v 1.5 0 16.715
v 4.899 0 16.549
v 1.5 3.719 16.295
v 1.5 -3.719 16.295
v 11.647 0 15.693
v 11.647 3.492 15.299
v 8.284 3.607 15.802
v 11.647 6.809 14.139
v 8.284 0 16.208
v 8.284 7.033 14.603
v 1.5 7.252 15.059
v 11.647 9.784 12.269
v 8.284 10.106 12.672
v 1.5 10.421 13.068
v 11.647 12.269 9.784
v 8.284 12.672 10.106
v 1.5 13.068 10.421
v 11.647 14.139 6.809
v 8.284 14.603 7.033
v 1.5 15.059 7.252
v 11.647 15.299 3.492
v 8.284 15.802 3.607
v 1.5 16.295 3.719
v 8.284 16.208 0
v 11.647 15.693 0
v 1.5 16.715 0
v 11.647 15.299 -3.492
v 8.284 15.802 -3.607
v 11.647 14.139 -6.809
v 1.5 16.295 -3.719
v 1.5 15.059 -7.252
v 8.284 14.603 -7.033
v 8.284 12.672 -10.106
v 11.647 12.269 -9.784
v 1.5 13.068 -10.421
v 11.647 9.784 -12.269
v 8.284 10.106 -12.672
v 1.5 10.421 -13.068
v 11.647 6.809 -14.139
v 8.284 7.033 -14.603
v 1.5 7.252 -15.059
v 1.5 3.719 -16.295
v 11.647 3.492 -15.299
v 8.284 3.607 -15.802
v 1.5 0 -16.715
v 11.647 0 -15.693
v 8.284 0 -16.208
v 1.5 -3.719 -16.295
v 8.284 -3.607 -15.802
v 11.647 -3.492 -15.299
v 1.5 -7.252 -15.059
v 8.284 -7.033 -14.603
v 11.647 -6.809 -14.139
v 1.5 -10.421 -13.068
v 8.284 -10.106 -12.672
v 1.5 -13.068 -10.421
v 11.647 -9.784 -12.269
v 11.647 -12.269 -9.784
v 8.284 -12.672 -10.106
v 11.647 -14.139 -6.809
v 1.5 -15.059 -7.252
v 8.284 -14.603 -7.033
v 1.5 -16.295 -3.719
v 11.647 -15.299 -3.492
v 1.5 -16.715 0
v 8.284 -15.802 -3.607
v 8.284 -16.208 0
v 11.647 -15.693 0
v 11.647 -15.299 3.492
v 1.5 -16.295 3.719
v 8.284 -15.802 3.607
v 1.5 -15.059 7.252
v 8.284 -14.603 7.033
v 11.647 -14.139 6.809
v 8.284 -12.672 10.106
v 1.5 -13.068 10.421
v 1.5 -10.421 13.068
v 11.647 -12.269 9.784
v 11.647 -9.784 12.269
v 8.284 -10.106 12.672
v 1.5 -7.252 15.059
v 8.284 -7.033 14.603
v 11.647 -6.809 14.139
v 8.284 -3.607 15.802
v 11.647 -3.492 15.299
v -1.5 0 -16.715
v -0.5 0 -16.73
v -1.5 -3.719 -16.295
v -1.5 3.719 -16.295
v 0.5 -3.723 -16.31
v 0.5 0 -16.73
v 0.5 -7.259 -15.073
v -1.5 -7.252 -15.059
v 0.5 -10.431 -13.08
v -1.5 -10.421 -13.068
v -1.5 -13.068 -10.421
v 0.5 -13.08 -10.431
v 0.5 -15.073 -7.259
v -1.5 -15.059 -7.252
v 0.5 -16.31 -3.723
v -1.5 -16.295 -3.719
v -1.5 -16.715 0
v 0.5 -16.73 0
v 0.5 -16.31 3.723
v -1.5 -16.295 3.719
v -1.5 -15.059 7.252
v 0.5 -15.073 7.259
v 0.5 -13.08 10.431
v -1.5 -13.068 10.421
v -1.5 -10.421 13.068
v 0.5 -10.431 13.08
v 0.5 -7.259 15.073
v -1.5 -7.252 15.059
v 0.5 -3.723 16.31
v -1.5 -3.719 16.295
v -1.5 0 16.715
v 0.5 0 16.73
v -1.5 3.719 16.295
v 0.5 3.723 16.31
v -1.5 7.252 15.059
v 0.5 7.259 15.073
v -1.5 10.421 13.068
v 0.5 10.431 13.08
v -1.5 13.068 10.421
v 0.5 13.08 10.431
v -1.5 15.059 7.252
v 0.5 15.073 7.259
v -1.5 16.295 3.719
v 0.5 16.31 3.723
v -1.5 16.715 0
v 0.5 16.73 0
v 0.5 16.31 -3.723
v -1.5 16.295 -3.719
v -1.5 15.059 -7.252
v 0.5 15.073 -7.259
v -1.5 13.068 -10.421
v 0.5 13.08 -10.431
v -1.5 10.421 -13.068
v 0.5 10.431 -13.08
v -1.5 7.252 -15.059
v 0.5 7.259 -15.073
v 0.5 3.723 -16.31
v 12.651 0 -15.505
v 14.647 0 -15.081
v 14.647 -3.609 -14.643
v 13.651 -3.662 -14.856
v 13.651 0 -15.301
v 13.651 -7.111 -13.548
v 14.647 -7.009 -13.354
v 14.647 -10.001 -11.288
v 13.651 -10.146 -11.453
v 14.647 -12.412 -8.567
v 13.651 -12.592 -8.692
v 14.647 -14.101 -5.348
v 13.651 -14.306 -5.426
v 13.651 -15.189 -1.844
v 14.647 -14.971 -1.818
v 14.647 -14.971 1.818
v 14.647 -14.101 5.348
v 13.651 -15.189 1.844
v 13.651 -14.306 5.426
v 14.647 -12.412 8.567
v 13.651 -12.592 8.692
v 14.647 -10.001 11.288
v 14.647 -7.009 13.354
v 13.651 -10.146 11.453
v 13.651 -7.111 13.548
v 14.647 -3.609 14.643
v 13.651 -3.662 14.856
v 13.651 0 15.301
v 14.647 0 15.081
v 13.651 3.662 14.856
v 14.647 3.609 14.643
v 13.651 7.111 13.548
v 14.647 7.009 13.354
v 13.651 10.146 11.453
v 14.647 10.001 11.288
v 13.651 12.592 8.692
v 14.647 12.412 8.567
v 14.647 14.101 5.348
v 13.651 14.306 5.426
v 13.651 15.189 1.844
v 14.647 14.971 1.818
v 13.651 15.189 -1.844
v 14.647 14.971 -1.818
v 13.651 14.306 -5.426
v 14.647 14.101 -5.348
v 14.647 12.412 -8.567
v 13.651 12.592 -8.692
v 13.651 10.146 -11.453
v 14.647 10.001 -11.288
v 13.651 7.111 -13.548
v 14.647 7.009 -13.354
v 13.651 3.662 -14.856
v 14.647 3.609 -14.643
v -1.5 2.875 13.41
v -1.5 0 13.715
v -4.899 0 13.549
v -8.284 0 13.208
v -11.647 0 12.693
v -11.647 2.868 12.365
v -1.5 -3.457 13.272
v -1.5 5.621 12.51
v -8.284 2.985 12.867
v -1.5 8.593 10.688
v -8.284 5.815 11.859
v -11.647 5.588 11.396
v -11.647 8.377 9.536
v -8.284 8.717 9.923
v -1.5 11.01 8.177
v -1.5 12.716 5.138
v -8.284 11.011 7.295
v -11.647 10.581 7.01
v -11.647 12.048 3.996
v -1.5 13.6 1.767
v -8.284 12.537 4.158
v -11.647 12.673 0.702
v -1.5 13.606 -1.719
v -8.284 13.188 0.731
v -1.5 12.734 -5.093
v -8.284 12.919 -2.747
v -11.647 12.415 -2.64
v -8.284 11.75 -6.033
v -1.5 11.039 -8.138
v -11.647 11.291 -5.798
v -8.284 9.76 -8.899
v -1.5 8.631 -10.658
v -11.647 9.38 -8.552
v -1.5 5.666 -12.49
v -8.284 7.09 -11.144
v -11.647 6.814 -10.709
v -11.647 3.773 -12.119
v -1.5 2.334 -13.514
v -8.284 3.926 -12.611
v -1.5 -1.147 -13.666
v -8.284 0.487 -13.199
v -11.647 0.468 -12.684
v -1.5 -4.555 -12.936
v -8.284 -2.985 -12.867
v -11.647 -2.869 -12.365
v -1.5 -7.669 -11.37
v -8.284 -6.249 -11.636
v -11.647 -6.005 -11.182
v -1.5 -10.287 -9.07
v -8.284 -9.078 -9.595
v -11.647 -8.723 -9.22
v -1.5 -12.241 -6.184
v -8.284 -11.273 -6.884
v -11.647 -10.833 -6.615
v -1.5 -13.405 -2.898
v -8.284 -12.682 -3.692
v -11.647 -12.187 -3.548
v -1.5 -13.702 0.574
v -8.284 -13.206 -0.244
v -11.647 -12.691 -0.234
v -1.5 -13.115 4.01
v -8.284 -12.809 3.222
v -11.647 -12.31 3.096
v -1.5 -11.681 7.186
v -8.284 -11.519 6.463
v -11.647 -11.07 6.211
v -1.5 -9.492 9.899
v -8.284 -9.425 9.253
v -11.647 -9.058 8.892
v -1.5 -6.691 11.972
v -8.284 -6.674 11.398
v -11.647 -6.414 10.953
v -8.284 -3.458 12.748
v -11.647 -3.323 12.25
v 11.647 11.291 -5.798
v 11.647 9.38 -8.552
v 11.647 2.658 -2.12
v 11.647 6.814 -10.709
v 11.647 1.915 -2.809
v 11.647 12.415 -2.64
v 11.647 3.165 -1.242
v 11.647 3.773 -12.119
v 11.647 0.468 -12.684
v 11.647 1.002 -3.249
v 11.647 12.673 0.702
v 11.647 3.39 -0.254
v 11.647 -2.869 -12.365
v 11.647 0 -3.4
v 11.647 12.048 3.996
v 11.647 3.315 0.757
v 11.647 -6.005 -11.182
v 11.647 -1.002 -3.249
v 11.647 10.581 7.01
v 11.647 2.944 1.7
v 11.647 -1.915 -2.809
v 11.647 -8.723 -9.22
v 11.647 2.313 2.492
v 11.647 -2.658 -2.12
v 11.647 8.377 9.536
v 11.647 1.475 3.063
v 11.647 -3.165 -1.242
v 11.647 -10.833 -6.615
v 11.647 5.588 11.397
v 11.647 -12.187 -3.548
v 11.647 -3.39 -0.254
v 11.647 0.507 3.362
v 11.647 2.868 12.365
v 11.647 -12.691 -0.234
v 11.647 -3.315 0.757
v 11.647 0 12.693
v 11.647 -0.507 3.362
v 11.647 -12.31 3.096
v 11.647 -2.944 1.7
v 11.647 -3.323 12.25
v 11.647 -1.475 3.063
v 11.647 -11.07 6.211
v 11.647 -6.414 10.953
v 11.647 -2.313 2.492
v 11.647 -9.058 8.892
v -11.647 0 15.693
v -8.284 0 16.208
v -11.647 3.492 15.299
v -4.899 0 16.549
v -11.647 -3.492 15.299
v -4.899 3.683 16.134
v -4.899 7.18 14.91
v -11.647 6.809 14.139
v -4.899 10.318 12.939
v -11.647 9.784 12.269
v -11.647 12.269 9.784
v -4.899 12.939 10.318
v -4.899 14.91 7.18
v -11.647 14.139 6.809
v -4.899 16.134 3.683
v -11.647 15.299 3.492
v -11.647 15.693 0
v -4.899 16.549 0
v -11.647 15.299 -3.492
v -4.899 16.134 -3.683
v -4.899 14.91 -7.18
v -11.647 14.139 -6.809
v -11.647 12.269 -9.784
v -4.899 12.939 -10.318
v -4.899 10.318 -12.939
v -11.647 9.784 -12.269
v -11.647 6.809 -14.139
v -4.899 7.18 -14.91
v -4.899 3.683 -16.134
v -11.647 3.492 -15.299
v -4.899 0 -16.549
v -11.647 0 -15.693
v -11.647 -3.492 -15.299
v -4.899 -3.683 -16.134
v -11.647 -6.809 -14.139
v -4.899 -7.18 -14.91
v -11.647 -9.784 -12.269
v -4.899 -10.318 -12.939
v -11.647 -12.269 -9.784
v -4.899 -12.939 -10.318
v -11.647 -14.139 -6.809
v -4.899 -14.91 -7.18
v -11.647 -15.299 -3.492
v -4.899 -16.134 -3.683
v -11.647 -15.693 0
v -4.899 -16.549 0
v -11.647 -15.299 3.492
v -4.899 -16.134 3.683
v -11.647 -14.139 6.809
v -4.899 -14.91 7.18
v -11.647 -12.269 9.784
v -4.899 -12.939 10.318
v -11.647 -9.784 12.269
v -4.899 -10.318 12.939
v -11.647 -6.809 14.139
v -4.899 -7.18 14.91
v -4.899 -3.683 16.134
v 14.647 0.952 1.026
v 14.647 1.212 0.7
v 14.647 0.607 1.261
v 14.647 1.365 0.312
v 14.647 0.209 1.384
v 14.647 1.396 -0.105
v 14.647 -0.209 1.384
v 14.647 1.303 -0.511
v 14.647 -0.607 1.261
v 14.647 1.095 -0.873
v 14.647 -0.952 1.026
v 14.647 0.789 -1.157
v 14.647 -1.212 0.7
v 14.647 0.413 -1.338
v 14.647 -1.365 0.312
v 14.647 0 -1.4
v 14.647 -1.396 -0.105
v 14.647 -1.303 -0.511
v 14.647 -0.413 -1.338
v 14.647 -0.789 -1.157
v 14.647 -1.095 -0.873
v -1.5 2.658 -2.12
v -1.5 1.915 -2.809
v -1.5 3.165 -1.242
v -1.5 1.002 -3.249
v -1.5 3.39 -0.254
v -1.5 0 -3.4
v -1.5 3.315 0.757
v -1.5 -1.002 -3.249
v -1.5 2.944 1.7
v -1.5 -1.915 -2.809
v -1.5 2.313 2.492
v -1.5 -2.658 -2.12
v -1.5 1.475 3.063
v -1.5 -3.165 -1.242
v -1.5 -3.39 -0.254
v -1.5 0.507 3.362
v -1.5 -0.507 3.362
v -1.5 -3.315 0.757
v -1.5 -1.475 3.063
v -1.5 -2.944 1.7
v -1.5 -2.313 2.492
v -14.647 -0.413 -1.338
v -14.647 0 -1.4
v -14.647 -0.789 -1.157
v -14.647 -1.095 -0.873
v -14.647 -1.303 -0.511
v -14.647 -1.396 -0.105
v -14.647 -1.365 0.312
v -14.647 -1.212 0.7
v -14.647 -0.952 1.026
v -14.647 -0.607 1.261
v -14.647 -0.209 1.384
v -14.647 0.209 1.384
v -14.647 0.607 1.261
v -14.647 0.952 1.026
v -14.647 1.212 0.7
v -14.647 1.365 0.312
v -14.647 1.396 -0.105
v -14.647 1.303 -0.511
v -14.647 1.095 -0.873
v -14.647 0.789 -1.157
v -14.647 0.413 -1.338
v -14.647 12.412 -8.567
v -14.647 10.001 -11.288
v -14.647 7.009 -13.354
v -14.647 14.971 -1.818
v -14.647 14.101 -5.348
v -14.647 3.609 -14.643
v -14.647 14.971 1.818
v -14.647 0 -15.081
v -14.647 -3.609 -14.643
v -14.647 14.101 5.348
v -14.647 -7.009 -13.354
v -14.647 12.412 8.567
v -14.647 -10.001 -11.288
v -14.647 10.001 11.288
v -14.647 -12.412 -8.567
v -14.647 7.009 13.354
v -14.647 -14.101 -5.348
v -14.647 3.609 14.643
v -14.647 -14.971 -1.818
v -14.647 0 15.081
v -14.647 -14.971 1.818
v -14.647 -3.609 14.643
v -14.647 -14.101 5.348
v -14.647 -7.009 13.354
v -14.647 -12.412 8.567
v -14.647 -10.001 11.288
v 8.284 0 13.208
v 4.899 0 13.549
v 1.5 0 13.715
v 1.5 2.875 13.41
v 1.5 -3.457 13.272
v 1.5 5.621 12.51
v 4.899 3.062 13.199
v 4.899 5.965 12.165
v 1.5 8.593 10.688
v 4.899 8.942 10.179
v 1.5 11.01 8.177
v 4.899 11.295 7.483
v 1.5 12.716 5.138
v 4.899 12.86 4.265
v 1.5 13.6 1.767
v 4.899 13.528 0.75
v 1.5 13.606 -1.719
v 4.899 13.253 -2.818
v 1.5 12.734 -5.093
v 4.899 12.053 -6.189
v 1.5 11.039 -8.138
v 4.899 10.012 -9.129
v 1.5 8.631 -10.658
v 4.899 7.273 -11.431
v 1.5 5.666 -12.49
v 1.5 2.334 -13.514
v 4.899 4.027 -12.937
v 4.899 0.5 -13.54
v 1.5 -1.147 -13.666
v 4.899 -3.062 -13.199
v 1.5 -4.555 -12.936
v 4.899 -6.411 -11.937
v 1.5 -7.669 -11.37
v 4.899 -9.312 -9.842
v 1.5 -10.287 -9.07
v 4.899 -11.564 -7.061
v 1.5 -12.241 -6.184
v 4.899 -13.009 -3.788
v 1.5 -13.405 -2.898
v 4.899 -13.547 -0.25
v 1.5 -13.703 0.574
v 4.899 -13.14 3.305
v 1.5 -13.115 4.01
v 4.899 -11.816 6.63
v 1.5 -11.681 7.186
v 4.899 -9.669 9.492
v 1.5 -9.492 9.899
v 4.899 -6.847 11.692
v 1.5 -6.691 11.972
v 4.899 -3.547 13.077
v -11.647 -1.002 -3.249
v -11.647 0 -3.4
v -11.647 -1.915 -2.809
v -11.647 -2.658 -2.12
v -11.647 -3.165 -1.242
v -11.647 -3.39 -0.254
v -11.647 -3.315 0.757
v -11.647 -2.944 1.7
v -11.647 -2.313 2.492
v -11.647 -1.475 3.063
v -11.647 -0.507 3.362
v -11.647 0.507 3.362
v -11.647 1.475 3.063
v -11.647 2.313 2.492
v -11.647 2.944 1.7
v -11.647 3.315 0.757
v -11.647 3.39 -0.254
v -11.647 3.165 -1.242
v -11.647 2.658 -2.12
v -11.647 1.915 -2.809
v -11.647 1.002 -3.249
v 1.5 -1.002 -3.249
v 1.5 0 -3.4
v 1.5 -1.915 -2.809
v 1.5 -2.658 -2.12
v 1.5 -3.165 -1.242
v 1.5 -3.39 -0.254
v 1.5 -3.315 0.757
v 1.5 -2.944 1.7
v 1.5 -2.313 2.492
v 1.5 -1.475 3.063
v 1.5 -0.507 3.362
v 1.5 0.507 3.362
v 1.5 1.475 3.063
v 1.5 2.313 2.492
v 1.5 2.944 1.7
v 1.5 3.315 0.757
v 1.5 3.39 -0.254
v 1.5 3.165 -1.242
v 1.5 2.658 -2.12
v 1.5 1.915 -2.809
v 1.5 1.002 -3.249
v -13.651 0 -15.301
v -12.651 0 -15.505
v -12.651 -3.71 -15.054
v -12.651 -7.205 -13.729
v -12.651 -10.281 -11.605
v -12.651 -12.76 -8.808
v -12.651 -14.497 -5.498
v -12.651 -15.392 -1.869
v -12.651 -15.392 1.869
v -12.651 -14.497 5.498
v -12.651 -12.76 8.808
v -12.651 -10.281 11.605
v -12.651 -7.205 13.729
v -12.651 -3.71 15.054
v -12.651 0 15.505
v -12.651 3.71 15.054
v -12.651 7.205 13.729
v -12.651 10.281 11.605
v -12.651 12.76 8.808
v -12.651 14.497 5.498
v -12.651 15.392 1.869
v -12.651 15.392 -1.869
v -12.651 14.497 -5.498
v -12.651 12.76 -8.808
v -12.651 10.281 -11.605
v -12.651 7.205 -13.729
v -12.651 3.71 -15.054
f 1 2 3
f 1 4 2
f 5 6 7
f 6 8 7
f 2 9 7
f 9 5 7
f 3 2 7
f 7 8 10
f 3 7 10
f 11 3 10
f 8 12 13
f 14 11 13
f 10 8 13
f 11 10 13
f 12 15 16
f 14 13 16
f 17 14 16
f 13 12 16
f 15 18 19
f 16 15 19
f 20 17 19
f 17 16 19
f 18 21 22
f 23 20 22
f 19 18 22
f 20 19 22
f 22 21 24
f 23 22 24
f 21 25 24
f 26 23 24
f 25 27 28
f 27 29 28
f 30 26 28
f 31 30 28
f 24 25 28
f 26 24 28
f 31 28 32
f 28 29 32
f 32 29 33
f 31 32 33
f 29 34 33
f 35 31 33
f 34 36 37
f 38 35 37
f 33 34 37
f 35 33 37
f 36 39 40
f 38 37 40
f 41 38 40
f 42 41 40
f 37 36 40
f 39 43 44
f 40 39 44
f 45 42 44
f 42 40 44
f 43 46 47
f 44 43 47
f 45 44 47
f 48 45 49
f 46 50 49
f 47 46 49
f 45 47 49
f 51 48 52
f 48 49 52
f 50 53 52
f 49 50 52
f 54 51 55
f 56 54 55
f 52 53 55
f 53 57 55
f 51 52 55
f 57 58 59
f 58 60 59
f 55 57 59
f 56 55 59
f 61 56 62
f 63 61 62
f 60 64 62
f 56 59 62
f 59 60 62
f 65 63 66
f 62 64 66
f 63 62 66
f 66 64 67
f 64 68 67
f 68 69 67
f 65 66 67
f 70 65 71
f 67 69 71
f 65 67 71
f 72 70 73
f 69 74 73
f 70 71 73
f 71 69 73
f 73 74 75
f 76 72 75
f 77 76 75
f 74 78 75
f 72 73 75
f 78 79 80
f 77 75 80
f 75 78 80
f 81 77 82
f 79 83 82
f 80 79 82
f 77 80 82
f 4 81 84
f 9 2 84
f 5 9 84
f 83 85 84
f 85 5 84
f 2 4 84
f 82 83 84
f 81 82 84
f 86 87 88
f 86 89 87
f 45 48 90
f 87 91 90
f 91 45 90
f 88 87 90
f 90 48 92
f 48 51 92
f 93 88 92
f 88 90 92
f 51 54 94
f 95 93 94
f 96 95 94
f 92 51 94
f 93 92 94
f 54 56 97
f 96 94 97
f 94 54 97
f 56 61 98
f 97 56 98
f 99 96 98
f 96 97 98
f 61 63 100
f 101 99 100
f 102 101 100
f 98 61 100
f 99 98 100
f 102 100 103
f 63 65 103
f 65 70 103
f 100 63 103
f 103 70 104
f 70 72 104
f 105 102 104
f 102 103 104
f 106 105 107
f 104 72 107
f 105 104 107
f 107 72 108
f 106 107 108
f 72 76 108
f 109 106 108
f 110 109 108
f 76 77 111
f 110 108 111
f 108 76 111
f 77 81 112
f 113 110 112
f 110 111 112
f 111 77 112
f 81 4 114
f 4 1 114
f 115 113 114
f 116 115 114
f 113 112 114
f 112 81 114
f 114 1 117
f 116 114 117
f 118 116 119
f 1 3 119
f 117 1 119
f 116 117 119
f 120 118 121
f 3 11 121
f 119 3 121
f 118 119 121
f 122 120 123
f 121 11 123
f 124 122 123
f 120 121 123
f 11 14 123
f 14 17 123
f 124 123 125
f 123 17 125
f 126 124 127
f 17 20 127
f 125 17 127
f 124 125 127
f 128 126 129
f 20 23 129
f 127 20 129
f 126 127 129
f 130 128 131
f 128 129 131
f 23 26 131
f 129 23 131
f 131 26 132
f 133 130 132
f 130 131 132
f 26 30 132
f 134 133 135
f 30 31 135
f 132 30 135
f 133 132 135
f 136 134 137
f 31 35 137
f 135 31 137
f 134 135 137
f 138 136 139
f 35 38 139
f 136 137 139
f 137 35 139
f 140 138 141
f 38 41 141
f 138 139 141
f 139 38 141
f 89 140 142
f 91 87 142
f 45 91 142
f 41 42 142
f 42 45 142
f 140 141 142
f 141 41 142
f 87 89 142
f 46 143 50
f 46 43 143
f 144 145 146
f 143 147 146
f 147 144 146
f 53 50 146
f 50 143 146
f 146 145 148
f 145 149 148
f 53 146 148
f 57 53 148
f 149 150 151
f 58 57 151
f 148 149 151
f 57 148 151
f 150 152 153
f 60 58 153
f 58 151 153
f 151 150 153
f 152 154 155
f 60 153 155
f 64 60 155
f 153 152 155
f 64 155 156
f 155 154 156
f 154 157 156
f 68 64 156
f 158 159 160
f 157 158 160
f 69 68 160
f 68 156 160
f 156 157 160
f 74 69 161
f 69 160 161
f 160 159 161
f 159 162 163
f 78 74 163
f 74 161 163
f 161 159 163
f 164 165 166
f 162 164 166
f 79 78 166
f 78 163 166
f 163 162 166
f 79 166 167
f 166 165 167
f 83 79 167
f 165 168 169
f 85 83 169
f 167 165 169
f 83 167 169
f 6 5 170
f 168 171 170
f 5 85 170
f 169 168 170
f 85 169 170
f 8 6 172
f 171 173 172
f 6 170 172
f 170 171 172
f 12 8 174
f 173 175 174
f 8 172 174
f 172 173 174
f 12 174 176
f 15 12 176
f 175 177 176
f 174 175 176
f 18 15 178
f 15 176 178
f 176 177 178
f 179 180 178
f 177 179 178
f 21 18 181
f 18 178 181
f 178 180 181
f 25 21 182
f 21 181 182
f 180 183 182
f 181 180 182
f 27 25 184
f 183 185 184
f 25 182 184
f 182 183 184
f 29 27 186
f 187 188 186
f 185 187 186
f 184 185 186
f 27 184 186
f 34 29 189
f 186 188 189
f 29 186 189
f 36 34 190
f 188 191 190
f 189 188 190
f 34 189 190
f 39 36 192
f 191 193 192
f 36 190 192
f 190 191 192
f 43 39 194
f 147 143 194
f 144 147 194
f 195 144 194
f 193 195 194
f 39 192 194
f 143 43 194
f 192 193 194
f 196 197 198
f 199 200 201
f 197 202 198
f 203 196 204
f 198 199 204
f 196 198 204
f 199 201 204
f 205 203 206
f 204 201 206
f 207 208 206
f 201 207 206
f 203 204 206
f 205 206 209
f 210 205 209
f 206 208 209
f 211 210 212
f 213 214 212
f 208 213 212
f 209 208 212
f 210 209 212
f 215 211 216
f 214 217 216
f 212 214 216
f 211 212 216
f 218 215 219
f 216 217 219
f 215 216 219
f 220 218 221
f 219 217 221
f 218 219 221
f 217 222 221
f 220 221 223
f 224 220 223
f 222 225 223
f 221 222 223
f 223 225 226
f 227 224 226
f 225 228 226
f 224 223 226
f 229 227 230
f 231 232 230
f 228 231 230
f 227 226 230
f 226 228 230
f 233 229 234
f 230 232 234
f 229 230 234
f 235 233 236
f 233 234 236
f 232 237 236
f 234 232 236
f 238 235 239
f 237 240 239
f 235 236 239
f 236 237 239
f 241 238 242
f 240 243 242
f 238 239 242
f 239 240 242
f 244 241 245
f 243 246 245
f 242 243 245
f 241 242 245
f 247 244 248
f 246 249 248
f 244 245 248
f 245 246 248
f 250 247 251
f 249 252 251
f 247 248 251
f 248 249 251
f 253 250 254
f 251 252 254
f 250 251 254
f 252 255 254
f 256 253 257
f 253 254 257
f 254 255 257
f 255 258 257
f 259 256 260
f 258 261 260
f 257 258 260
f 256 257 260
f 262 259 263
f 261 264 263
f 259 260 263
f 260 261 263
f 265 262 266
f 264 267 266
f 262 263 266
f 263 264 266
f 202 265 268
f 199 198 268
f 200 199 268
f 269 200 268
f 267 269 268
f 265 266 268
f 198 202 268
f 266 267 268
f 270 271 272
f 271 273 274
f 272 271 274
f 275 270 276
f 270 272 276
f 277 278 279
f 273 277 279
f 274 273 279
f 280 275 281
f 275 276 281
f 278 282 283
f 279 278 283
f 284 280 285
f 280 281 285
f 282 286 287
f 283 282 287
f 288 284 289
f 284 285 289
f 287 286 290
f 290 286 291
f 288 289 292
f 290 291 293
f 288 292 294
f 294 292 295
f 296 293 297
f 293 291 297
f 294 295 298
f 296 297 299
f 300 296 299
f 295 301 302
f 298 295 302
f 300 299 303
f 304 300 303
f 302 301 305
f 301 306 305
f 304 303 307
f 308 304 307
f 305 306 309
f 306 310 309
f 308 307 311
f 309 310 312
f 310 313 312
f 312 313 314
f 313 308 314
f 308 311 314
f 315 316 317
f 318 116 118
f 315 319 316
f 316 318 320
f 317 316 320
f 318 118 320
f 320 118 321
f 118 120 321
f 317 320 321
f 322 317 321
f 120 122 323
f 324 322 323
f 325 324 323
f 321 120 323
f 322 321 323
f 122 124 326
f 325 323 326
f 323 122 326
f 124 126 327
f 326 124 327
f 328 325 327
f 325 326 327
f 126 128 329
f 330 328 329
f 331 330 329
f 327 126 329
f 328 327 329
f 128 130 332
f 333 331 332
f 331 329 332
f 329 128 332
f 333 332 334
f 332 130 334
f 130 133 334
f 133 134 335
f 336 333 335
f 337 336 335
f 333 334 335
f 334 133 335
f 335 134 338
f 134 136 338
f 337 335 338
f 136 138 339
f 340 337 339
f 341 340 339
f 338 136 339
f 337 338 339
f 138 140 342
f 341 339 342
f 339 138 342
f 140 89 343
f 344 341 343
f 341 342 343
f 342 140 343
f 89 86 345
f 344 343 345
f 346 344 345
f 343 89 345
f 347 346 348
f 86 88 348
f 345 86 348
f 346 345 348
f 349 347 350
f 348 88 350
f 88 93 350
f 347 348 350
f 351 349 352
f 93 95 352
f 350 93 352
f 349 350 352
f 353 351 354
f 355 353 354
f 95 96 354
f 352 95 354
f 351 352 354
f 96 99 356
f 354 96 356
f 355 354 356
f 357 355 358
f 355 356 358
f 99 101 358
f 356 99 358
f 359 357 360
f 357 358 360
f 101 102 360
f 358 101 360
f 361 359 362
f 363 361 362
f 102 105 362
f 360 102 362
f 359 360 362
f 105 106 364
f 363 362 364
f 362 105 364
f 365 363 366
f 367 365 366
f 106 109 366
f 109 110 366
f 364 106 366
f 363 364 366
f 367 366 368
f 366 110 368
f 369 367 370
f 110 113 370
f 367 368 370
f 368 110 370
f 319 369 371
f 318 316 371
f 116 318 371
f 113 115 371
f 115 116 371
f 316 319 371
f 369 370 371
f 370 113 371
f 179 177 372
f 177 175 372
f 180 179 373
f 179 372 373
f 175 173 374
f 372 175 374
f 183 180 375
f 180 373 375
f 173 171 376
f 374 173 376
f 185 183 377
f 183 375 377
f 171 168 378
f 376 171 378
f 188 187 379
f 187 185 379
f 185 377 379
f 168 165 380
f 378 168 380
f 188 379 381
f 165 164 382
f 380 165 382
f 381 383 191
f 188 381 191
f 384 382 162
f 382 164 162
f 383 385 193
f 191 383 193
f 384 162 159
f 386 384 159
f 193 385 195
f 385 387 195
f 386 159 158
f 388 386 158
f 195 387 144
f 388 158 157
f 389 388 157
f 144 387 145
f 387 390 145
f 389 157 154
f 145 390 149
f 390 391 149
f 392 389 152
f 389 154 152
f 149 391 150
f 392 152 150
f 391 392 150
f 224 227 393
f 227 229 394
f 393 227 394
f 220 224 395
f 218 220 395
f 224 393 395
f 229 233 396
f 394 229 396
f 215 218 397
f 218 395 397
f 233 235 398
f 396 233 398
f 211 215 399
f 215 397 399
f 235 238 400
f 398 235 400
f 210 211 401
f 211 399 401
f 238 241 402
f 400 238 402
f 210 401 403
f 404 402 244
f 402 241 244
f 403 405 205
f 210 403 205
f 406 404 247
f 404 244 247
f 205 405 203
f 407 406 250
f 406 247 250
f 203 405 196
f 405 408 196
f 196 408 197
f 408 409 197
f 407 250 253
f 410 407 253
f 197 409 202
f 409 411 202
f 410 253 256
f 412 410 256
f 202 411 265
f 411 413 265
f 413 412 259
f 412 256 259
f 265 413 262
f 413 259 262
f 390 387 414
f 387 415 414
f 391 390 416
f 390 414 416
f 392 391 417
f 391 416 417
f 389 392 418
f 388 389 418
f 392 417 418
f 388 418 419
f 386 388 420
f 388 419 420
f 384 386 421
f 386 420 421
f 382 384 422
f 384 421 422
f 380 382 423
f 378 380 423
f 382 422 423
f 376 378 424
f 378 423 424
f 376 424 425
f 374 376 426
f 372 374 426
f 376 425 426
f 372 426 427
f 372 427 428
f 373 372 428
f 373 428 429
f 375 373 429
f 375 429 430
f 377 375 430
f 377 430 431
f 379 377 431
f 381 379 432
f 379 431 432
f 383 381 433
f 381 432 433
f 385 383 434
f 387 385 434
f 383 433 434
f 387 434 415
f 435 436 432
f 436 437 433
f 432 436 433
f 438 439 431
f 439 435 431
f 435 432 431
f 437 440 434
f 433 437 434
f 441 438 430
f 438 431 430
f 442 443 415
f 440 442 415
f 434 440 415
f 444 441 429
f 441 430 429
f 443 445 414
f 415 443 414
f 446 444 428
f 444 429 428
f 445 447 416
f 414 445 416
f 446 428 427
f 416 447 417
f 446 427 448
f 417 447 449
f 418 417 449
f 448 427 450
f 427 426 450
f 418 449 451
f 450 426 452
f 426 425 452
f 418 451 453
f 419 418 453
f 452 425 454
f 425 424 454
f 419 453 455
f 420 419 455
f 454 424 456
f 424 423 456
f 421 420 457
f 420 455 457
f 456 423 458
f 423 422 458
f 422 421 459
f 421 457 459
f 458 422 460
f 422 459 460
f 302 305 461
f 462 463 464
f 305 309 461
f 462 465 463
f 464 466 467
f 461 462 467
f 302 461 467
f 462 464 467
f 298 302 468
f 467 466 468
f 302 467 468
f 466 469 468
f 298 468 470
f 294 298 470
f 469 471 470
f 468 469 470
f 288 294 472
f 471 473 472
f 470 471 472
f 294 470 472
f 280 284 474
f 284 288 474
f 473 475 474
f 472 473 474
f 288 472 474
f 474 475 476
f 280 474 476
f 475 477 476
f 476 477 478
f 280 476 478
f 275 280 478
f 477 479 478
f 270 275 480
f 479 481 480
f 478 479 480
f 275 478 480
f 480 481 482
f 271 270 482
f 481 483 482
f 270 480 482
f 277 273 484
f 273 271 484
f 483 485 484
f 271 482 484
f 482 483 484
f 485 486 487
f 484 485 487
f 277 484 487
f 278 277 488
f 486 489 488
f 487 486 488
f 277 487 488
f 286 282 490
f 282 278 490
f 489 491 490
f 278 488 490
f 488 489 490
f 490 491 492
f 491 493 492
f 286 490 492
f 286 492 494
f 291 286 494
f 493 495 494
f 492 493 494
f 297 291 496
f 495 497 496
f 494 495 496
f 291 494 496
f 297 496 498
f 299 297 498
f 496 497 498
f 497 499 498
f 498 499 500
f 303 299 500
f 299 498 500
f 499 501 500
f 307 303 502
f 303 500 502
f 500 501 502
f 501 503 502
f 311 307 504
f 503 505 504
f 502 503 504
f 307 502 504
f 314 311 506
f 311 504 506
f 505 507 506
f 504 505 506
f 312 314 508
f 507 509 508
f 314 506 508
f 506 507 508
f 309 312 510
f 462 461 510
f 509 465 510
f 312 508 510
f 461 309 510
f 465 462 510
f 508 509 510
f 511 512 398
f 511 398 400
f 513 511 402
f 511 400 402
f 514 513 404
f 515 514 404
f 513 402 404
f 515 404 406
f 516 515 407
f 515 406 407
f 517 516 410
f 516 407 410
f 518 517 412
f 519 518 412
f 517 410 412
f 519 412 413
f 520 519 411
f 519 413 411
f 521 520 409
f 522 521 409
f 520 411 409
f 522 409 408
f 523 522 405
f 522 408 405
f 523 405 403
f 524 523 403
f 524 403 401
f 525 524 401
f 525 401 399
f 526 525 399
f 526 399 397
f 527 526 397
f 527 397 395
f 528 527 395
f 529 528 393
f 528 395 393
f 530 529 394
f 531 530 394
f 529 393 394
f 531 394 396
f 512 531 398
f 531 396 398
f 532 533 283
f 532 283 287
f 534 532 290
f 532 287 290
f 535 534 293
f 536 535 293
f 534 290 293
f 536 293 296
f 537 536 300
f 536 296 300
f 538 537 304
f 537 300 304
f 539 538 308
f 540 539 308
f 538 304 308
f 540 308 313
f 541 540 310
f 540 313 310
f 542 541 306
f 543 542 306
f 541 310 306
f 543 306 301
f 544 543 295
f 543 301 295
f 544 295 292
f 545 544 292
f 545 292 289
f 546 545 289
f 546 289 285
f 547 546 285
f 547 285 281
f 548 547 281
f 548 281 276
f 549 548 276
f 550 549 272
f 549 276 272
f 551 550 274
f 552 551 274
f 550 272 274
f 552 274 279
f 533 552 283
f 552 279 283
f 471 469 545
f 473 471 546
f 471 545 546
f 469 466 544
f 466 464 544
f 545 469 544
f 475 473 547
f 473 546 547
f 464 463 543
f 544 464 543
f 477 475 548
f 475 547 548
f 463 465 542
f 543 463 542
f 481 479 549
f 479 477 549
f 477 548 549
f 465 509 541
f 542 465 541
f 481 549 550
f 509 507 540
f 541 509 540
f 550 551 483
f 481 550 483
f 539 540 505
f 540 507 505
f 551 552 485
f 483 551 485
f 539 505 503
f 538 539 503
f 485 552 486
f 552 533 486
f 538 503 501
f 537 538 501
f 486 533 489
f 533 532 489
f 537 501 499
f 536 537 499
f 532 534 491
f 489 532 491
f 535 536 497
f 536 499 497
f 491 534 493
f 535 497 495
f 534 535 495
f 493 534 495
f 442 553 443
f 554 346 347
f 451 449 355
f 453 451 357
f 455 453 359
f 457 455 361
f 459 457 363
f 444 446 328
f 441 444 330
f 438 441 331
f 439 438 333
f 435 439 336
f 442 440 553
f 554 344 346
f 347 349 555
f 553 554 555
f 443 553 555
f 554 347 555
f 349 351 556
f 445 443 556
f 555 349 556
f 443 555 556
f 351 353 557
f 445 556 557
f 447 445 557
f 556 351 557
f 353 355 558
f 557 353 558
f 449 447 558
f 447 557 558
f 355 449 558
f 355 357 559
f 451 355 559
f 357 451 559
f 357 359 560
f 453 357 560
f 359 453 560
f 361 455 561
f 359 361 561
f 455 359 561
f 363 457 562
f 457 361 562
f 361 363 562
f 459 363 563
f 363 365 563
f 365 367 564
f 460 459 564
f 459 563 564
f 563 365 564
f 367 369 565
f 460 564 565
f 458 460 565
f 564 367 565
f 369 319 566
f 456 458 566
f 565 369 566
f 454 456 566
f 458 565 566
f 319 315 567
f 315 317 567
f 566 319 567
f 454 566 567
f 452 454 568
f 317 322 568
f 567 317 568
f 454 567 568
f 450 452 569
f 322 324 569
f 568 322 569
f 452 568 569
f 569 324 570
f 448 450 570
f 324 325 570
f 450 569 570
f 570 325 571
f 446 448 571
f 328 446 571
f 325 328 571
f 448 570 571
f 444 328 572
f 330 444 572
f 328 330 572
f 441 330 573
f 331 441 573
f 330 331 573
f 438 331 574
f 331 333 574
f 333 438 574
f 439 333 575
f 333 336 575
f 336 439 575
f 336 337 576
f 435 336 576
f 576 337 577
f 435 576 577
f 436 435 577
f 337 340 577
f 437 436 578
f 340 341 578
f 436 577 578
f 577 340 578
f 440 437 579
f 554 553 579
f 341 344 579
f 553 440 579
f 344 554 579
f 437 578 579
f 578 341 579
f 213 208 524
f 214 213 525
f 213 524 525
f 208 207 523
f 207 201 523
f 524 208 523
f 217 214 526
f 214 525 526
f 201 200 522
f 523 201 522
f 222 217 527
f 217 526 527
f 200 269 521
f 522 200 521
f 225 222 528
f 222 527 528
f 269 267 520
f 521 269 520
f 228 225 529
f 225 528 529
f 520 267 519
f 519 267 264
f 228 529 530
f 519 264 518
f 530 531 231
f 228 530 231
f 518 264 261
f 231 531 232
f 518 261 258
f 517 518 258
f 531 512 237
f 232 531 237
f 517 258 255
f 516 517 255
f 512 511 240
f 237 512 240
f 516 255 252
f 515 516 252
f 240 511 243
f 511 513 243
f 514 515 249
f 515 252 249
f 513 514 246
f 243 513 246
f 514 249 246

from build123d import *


with BuildPart() as part:
    # Sketch3 → Revolve1 (revolve)
    with BuildSketch(Plane.XY, mode=Mode.PRIVATE) as revolve1_sk:
        with BuildLine():
            Line((-14.647440478, 1.4), (-14.647440478, 15.08125))
            ThreePointArc((-14.647440478, 15.08125), (-13.150997434, 15.404541787), (-11.647440478, 15.69294401))
            Line((-11.647440478, 15.69294401), (-11.647440478, 3.4))
            Line((-11.647440478, 3.4), (-1.5, 3.4))
            Line((-1.5, 3.4), (-1.5, 16.71452719))
            ThreePointArc((-1.5, 16.71452719), (0, 16.731620181), (1.5, 16.71452719))
            Line((1.5, 16.71452719), (1.5, 3.4))
            Line((1.5, 3.4), (11.647440478, 3.4))
            Line((11.647440478, 3.4), (11.647440478, 15.69294401))
            ThreePointArc((11.647440478, 15.69294401), (13.150997434, 15.404541787), (14.647440478, 15.08125))
            Line((14.647440478, 15.08125), (14.647440478, 1.4))
            Line((14.647440478, 1.4), (-14.647440478, 1.4))
        make_face()
    revolve(revolve1_sk.sketch.rotate(Axis((23.642125672, 0, 0), (-1, 0, 0)), 90), axis=Axis((23.642125672, 0, 0), (-1, 0, 0)))

    # Sketch4 → Revolve2 (revolve)
    with BuildSketch(Plane.XY, mode=Mode.PRIVATE) as revolve2_sk:
        with BuildLine():
            Line((-14.647440478, 12.08125), (-14.647440478, 15.08125))
            ThreePointArc((-14.647440478, 15.08125), (0, 16.731620181), (14.647440478, 15.08125))
            Line((14.647440478, 15.08125), (14.647440478, 12.08125))
            ThreePointArc((14.647440478, 12.08125), (0, 13.731620181), (-14.647440478, 12.08125))
        make_face()
    revolve(revolve2_sk.sketch.rotate(Axis((23.642125672, 0, 0), (-1, 0, 0)), 270), axis=Axis((23.642125672, 0, 0), (-1, 0, 0)))


solid = part.part
